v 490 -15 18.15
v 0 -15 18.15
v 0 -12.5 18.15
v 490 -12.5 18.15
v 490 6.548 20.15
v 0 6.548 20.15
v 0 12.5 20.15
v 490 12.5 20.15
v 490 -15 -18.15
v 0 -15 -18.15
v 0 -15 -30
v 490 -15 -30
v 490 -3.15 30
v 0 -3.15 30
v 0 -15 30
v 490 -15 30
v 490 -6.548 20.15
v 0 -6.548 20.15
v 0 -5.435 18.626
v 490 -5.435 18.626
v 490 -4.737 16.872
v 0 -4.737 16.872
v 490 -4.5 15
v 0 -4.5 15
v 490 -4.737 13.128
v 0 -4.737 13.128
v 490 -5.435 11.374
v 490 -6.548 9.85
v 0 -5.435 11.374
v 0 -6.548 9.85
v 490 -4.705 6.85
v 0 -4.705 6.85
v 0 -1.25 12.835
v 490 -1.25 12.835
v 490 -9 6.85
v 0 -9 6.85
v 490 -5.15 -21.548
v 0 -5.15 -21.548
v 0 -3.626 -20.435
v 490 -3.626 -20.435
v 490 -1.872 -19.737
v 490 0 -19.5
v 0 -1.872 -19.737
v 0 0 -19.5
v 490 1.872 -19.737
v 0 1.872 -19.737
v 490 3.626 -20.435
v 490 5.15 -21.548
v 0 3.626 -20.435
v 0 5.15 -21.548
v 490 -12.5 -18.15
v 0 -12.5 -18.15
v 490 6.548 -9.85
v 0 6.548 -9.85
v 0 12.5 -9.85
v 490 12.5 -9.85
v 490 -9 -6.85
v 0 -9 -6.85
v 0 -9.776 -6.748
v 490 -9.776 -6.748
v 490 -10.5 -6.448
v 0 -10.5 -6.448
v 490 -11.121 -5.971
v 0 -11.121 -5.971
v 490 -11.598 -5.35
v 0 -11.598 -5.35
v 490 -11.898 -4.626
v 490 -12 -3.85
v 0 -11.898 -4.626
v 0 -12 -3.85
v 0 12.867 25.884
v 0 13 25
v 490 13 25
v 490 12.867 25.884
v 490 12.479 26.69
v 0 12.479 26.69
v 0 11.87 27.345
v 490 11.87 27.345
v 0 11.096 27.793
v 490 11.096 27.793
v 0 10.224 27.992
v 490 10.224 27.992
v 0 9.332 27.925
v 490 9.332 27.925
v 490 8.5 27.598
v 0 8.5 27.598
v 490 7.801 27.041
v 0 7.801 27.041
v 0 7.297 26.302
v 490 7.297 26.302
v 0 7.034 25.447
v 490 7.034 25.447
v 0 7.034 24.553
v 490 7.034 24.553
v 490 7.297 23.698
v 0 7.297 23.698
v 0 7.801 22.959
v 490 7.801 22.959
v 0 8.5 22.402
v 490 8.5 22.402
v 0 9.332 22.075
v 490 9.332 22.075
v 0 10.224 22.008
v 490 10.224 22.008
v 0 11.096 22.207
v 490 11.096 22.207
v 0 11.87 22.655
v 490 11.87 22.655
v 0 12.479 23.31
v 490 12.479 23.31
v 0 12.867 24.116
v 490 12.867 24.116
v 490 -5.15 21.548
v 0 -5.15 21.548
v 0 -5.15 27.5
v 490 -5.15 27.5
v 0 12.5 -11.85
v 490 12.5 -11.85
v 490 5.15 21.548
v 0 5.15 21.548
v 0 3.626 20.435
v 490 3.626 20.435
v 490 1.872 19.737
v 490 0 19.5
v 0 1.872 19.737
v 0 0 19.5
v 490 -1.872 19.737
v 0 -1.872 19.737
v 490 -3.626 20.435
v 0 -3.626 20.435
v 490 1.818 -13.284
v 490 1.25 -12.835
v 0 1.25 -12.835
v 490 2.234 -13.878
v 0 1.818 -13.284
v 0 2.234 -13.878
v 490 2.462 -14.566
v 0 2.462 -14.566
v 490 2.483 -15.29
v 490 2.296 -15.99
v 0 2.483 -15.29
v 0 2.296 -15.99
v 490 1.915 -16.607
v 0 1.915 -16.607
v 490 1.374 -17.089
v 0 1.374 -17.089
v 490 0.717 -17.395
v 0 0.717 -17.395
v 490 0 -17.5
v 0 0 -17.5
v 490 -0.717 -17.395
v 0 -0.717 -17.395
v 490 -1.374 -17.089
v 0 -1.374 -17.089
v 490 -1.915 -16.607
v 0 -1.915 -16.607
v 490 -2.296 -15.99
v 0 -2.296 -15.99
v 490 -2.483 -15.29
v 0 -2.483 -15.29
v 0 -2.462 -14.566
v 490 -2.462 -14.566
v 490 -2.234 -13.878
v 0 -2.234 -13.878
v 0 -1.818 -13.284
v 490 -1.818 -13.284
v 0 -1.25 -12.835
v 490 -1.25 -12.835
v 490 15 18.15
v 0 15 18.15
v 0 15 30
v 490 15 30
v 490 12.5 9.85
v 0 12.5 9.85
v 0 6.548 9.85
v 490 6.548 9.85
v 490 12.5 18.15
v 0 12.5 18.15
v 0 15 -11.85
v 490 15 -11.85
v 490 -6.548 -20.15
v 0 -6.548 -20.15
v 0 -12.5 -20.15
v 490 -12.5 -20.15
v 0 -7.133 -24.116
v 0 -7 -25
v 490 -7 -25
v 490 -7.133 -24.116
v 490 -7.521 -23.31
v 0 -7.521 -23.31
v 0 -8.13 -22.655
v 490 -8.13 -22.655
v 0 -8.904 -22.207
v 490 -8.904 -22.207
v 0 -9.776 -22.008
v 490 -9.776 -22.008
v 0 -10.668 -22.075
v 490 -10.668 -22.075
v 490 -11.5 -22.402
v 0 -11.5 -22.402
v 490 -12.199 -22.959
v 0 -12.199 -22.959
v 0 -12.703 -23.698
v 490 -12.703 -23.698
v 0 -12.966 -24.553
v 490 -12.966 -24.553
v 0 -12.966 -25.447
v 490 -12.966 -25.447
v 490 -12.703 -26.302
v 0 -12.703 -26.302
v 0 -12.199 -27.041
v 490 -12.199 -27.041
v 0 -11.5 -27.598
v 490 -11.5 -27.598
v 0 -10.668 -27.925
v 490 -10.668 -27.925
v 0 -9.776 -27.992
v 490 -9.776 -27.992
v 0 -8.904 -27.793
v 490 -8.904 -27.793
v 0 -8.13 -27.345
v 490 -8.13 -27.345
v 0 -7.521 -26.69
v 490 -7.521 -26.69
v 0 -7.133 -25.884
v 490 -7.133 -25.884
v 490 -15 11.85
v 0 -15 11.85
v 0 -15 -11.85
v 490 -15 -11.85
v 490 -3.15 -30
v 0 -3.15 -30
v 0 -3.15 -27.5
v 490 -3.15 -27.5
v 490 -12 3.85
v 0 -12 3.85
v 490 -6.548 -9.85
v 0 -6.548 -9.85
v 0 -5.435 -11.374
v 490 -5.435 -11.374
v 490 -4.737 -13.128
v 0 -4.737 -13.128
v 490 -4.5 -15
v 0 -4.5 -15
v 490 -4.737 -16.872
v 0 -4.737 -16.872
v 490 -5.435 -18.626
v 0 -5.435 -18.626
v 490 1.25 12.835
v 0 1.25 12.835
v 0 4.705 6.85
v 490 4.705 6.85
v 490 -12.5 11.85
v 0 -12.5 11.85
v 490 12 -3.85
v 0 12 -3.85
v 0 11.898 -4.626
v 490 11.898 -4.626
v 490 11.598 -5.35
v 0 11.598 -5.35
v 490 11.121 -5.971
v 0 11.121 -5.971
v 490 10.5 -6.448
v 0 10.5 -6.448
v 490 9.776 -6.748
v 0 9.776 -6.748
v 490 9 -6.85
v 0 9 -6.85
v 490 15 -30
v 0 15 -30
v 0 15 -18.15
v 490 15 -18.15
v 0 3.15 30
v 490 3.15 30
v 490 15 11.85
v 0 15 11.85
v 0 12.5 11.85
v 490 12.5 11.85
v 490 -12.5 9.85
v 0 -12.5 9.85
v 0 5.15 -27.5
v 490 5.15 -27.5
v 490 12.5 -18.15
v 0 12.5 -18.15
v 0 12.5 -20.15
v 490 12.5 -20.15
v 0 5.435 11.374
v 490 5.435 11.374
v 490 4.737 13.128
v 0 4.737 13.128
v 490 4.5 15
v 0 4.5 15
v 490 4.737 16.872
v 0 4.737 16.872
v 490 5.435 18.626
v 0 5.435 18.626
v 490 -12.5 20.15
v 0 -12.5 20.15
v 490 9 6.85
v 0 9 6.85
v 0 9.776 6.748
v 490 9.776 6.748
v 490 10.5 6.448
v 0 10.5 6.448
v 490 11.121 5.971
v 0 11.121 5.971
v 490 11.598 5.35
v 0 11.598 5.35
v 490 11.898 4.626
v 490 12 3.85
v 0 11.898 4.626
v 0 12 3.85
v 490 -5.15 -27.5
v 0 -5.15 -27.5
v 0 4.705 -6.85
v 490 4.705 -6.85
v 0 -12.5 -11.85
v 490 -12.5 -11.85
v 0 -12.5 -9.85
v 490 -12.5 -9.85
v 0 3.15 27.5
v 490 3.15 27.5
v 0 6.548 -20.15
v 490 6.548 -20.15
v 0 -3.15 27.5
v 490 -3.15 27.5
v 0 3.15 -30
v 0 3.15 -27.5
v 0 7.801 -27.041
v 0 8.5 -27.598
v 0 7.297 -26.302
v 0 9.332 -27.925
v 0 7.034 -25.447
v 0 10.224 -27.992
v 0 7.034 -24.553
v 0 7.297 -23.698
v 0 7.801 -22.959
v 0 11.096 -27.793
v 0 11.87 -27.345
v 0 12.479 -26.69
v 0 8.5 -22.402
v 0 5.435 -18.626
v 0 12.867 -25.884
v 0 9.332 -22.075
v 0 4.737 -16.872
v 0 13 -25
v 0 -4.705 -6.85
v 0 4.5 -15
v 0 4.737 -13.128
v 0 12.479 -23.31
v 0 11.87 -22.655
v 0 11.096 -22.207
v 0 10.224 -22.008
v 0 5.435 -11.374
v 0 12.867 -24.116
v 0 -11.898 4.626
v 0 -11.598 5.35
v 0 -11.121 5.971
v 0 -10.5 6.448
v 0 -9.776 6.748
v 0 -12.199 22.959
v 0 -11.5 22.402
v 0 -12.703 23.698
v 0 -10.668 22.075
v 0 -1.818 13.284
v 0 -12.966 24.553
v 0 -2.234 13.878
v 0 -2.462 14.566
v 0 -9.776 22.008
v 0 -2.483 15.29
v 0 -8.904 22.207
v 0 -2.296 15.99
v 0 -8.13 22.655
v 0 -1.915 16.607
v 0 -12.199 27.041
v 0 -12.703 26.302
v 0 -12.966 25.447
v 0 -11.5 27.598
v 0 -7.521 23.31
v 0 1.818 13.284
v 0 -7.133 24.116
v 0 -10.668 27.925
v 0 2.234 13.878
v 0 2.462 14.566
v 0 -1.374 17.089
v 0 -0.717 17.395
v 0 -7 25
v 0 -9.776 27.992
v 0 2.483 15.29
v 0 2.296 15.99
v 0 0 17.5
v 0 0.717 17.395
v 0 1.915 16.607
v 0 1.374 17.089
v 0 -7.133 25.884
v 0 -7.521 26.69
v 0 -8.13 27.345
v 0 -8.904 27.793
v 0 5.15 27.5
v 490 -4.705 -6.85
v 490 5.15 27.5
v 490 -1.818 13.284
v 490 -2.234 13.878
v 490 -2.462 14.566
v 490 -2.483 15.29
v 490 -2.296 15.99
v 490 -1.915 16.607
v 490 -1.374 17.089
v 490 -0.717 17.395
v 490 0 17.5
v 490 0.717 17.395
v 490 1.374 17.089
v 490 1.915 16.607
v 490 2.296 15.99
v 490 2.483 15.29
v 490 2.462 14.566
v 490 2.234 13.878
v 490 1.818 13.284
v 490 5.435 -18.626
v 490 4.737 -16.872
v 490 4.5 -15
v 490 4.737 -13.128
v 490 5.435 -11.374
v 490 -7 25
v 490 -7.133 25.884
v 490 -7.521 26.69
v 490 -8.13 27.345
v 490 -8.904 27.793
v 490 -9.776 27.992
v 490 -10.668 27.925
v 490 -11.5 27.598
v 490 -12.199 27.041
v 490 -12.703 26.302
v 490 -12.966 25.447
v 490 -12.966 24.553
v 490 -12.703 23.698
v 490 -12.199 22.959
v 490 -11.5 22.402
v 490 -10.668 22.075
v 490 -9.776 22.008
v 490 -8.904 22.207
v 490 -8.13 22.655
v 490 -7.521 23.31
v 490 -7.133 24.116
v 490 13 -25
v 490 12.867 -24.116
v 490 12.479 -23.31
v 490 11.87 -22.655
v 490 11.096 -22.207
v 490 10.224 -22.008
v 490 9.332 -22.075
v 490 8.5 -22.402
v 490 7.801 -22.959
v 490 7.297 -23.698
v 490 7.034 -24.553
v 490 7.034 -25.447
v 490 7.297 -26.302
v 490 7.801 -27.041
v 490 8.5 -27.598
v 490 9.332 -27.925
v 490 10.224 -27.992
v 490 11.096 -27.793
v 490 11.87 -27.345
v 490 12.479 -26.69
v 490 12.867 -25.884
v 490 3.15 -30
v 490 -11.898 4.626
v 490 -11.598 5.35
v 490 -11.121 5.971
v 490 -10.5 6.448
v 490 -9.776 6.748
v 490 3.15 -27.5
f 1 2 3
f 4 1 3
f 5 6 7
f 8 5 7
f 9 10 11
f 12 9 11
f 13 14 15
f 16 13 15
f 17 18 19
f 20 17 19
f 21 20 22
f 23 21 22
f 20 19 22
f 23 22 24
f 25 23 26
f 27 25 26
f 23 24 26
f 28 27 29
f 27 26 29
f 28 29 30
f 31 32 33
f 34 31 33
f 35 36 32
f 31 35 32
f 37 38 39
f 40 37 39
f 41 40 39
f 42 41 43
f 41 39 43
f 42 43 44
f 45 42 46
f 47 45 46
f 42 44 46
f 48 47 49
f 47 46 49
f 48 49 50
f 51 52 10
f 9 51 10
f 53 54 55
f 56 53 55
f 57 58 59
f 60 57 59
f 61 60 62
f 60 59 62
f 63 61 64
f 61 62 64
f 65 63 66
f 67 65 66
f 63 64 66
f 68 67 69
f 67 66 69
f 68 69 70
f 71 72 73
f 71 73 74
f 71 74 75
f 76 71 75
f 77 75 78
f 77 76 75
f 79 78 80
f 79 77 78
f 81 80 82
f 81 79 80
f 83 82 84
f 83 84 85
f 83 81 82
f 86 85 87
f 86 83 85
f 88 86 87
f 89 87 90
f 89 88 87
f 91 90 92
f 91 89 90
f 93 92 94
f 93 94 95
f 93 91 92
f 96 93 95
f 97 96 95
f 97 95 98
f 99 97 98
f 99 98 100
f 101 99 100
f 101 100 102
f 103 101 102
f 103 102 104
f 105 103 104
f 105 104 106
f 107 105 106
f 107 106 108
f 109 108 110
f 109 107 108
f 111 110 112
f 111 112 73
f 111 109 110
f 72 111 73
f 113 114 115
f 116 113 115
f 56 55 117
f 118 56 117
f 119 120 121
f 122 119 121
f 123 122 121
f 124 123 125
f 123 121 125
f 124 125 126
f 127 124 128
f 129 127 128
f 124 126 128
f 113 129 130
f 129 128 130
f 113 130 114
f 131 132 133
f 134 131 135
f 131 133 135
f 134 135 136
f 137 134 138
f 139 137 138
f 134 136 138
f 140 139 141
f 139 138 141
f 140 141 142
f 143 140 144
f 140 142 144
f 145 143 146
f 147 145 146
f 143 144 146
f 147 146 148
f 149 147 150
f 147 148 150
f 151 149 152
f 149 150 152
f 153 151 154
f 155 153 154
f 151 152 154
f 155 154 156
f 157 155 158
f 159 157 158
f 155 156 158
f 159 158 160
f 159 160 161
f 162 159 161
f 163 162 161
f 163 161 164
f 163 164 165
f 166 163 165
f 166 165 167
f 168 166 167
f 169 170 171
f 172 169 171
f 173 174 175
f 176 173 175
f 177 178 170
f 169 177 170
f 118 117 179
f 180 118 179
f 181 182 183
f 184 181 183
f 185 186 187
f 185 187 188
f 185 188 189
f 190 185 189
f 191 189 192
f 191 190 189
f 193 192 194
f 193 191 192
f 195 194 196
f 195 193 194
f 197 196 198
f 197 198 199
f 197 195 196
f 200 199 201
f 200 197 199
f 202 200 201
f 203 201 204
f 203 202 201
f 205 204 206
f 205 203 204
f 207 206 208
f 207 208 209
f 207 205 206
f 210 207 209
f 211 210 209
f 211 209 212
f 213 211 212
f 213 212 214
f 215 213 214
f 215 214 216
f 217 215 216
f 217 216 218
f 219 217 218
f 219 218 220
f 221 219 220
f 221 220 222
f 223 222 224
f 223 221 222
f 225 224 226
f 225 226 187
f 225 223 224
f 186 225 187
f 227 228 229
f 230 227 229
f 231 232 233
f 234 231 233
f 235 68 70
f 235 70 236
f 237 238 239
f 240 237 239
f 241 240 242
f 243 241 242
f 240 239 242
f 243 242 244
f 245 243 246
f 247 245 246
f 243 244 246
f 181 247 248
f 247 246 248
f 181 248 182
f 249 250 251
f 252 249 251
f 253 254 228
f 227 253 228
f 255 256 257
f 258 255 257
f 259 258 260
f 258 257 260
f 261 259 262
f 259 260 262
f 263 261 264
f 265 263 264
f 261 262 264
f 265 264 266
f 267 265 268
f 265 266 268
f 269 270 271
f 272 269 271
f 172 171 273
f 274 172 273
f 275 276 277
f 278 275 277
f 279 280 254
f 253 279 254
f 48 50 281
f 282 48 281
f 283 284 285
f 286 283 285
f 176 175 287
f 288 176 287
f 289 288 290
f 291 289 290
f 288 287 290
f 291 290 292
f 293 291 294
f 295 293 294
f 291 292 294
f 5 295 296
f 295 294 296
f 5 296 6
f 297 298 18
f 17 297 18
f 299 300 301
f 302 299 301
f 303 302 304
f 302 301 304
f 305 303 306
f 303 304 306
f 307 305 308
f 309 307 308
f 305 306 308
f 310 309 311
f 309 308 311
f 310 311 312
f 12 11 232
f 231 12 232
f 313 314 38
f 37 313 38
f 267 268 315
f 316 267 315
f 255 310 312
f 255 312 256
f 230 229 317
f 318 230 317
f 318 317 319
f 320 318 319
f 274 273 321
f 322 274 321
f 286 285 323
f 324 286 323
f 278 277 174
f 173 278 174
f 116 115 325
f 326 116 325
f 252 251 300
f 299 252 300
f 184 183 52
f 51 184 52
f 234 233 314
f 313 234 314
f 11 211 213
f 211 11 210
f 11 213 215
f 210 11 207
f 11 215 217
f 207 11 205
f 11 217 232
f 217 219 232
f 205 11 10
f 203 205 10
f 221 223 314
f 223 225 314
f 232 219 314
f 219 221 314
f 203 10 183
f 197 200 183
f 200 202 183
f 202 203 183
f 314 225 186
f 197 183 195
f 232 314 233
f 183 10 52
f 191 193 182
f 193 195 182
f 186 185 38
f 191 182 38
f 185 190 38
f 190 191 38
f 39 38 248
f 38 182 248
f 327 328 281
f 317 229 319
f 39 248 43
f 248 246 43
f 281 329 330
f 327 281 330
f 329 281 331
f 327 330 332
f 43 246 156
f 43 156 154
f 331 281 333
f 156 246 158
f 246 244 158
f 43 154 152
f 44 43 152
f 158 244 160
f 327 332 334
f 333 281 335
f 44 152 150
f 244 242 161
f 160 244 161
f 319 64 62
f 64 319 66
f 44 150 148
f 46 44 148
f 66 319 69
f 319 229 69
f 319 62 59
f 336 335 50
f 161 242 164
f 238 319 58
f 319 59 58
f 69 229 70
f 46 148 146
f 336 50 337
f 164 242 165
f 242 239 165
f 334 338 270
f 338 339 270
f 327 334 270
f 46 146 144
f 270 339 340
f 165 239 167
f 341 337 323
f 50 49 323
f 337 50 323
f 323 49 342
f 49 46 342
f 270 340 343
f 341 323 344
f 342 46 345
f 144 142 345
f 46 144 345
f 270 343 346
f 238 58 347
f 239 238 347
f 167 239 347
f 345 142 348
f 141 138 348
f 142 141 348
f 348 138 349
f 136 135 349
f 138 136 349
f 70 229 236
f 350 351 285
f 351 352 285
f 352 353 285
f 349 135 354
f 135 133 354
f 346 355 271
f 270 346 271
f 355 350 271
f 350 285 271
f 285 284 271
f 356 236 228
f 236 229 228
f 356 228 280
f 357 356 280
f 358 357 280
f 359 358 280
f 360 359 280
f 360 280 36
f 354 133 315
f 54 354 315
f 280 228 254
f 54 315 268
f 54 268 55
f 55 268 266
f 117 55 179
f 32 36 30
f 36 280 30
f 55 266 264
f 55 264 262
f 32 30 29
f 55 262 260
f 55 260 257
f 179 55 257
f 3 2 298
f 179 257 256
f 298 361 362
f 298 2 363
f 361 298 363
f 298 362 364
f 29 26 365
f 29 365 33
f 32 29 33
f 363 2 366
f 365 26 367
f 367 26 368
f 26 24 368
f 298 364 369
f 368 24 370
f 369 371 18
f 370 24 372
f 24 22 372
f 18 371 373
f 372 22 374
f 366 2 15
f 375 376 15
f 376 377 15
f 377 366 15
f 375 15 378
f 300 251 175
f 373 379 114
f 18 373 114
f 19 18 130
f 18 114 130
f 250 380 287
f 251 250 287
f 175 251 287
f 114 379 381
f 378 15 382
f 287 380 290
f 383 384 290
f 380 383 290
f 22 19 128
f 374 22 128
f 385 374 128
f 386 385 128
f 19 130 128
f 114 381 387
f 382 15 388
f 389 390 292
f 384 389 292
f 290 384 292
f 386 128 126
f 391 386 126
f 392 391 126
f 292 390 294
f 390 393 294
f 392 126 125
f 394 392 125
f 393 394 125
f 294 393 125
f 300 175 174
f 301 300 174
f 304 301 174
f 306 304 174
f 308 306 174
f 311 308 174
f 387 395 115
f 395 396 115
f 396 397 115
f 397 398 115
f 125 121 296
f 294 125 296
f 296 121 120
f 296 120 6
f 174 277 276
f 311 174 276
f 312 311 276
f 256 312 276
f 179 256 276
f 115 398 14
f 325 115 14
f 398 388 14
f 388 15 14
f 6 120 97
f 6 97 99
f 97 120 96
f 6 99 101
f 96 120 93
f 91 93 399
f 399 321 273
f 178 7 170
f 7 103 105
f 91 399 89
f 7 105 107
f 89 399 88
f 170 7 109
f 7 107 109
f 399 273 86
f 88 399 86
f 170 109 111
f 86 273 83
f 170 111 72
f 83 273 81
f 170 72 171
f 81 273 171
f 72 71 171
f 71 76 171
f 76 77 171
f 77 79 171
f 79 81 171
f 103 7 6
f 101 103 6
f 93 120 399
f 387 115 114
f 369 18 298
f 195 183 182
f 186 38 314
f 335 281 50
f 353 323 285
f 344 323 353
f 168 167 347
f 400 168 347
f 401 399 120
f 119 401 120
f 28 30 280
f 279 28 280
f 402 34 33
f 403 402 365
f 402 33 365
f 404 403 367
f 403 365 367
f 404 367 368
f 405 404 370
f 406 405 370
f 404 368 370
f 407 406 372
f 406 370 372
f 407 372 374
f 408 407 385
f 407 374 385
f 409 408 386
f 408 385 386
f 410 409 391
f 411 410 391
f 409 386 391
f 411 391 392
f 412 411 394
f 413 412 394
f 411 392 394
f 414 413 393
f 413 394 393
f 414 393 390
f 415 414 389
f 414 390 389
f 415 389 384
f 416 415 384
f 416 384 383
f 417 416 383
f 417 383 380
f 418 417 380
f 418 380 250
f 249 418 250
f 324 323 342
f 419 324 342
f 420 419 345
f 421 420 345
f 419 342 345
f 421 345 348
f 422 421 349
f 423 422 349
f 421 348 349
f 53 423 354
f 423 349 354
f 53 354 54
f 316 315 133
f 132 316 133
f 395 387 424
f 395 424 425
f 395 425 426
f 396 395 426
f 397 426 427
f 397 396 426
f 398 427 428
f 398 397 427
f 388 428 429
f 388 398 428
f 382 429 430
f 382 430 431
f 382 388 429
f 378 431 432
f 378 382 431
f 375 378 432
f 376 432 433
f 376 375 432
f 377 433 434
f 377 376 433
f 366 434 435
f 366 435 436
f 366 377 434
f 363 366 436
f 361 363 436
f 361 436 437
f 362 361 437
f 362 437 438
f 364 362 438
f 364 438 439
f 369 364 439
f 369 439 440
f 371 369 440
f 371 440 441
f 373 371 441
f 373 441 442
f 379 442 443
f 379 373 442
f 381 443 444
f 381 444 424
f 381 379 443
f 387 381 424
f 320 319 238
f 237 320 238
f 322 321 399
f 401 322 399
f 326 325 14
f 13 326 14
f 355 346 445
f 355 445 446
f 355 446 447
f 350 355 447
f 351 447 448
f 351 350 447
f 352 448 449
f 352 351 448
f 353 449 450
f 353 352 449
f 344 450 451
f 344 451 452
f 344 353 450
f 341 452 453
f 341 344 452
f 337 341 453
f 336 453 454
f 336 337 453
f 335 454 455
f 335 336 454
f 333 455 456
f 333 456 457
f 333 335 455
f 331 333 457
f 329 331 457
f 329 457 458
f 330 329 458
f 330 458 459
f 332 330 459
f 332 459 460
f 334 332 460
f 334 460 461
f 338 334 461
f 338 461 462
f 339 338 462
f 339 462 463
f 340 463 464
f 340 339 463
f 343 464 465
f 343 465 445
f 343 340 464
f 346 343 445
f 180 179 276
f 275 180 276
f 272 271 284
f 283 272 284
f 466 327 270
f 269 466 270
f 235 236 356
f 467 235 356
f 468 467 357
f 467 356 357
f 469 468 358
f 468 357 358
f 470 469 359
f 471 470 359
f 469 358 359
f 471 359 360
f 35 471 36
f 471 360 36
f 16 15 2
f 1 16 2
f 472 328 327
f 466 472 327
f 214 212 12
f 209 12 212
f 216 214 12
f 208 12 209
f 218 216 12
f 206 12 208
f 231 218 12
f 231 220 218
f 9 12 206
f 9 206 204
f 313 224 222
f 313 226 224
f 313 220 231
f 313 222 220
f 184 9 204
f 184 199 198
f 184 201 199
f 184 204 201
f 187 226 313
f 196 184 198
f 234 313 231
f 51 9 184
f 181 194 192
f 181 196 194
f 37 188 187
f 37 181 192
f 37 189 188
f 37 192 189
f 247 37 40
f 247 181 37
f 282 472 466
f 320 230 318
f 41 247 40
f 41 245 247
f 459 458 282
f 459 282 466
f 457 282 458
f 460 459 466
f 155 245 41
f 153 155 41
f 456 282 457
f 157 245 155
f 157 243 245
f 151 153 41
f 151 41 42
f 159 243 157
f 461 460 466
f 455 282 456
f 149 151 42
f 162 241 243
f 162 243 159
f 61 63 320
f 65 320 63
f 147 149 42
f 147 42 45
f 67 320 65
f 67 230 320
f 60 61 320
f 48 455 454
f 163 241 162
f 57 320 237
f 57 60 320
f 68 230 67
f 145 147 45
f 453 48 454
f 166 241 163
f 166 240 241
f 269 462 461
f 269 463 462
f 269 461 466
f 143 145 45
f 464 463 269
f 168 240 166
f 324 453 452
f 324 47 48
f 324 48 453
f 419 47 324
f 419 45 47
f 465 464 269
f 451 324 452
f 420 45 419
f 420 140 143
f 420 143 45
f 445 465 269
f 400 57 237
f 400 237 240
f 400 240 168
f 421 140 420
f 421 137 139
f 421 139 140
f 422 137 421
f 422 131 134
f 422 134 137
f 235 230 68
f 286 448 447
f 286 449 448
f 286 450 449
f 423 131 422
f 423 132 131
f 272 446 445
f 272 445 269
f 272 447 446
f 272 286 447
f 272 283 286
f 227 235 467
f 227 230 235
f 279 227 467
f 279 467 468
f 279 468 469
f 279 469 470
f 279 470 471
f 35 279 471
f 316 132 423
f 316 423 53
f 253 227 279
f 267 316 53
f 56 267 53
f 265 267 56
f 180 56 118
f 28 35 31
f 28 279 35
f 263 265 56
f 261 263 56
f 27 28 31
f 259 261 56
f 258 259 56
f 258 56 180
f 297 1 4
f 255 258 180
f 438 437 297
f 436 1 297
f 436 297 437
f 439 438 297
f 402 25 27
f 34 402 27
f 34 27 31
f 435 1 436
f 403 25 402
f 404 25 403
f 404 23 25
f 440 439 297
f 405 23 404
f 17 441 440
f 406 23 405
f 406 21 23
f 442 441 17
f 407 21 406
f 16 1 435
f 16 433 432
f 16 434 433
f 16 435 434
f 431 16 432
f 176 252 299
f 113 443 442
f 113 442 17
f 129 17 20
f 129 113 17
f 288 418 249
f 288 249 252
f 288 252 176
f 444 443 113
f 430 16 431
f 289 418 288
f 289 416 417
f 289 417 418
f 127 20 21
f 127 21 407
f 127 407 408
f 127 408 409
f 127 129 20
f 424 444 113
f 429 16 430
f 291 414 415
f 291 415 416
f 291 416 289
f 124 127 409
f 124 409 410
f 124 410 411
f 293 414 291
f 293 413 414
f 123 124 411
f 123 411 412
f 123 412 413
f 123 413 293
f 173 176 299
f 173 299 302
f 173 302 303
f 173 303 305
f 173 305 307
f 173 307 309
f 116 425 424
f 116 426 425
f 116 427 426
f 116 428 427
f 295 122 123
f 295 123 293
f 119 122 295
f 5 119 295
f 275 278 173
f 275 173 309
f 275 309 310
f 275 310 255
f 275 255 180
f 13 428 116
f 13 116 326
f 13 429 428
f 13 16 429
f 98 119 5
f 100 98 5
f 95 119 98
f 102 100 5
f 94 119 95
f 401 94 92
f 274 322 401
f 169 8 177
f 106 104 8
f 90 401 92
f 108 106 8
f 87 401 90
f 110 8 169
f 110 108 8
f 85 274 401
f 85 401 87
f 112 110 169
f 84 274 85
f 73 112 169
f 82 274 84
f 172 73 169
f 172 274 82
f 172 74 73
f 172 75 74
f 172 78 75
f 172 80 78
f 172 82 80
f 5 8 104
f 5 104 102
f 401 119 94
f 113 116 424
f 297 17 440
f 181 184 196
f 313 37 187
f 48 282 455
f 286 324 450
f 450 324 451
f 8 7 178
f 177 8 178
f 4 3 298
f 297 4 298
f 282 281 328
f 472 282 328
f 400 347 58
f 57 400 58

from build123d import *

# Parameters (mm, degrees)
F0_R     = 3
F1_DEPTH = 490


# Not quite as in the source:
# - ends of sketch curves that miss each other by under 0.0002 mm in the source are joined


with BuildPart() as f1:
    # F0 (on Right) → F1 (new body)
    with BuildSketch(Plane.YZ):
        with BuildLine():
            Line((12.5, -11.85), (15, -11.85))
            Line((15, -11.85), (15, 11.85))
            Line((15, 11.85), (12.5, 11.85))
            Line((12.5, 11.85), (12.5, 9.85))
            Line((12.5, 9.85), (6.547707, 9.85))
            ThreePointArc((6.5477069495, 9.8499999523), (4.5, 15), (6.5477069495, 20.1500000477))
            Line((6.547707, 20.15), (12.5, 20.15))
            Line((12.5, 20.15), (12.5, 18.15))
            Line((12.5, 18.15), (15, 18.15))
            Line((15, 18.15), (15, 30))
            Line((15, 30), (3.15, 30))
            Line((3.15, 30), (3.15, 27.5))
            Line((3.15, 27.5), (5.15, 27.5))
            Line((5.15, 27.5), (5.15, 21.547707))
            ThreePointArc((5.1500000477, 21.5477069495), (0, 19.5), (-5.1500000477, 21.5477069495))
            Line((-5.15, 21.547707), (-5.15, 27.5))
            Line((-5.15, 27.5), (-3.15, 27.5))
            Line((-3.15, 27.5), (-3.15, 30))
            Line((-3.15, 30), (-15, 30))
            Line((-15, 30), (-15, 18.15))
            Line((-15, 18.15), (-12.5, 18.15))
            Line((-12.5, 18.15), (-12.5, 20.15))
            Line((-12.5, 20.15), (-6.547707, 20.15))
            ThreePointArc((-6.5477069495, 20.1500000477), (-4.5, 15), (-6.5477069495, 9.8499999523))
            Line((-6.547707, 9.85), (-12.5, 9.85))
            Line((-12.5, 9.85), (-12.5, 11.85))
            Line((-12.5, 11.85), (-15, 11.85))
            Line((-15, 11.85), (-15, -11.85))
            Line((-15, -11.85), (-12.5, -11.85))
            Line((-12.5, -11.85), (-12.5, -9.85))
            Line((-12.5, -9.85), (-6.547707, -9.85))
            ThreePointArc((-6.5477069495, -9.8499999523), (-4.5, -15), (-6.5477069495, -20.1500000477))
            Line((-6.547707, -20.15), (-12.5, -20.15))
            Line((-12.5, -20.15), (-12.5, -18.15))
            Line((-12.5, -18.15), (-15, -18.15))
            Line((-15, -18.15), (-15, -30))
            Line((-15, -30), (-3.15, -30))
            Line((-3.15, -30), (-3.15, -27.5))
            Line((-3.15, -27.5), (-5.15, -27.5))
            Line((-5.15, -27.5), (-5.15, -21.547707))
            ThreePointArc((-5.1500000477, -21.5477069495), (0, -19.5), (5.1500000477, -21.5477069495))
            Line((5.15, -21.547707), (5.15, -27.5))
            Line((5.15, -27.5), (3.15, -27.5))
            Line((3.15, -27.5), (3.15, -30))
            Line((3.15, -30), (15, -30))
            Line((15, -30), (15, -18.15))
            Line((15, -18.15), (12.5, -18.15))
            Line((12.5, -18.15), (12.5, -20.15))
            Line((12.5, -20.15), (6.547707, -20.15))
            ThreePointArc((6.5477069495, -20.1500000477), (4.5, -15), (6.5477069495, -9.8499999523))
            Line((6.547707, -9.85), (12.5, -9.85))
            Line((12.5, -9.85), (12.5, -11.85))
        make_face()
        with Locations((-10, -25)):
            Circle(F0_R, mode=Mode.SUBTRACT)
        with Locations((10, -25)):
            Circle(F0_R, mode=Mode.SUBTRACT)
        with Locations((-10, 25)):
            Circle(F0_R, mode=Mode.SUBTRACT)
        with BuildLine():
            ThreePointArc((-12, 3.85), (-11.1213203436, 5.9713203436), (-9, 6.85))
            Line((-9, 6.85), (-4.705405, 6.85))
            Line((-4.705405, 6.85), (-1.25, 12.834936))
            ThreePointArc((-1.25, 12.834936), (0, 17.5), (1.2499997876, 12.8349363679))
            Line((1.2499997876, 12.8349363679), (4.705405, 6.85))
            Line((4.705405, 6.85), (9, 6.85))
            ThreePointArc((9, 6.85), (11.1213203436, 5.9713203436), (12, 3.85))
            Line((12, 3.85), (12, -3.85))
            ThreePointArc((12, -3.85), (11.1213203436, -5.9713203436), (9, -6.85))
            Line((9, -6.85), (4.705405, -6.85))
            Line((4.705405, -6.85), (1.25, -12.834937))
            ThreePointArc((1.25, -12.834937), (0, -17.5), (-1.2500002206, -12.8349366179))
            Line((-1.2500002206, -12.8349366179), (-4.705405, -6.85))
            Line((-4.705405, -6.85), (-9, -6.85))
            ThreePointArc((-9, -6.85), (-11.1213203436, -5.9713203436), (-12, -3.85))
            Line((-12, -3.85), (-12, 3.85))
        make_face(mode=Mode.SUBTRACT)
        with Locations((10, 25)):
            Circle(F0_R, mode=Mode.SUBTRACT)
    extrude(amount=F1_DEPTH)


solid = f1.part
